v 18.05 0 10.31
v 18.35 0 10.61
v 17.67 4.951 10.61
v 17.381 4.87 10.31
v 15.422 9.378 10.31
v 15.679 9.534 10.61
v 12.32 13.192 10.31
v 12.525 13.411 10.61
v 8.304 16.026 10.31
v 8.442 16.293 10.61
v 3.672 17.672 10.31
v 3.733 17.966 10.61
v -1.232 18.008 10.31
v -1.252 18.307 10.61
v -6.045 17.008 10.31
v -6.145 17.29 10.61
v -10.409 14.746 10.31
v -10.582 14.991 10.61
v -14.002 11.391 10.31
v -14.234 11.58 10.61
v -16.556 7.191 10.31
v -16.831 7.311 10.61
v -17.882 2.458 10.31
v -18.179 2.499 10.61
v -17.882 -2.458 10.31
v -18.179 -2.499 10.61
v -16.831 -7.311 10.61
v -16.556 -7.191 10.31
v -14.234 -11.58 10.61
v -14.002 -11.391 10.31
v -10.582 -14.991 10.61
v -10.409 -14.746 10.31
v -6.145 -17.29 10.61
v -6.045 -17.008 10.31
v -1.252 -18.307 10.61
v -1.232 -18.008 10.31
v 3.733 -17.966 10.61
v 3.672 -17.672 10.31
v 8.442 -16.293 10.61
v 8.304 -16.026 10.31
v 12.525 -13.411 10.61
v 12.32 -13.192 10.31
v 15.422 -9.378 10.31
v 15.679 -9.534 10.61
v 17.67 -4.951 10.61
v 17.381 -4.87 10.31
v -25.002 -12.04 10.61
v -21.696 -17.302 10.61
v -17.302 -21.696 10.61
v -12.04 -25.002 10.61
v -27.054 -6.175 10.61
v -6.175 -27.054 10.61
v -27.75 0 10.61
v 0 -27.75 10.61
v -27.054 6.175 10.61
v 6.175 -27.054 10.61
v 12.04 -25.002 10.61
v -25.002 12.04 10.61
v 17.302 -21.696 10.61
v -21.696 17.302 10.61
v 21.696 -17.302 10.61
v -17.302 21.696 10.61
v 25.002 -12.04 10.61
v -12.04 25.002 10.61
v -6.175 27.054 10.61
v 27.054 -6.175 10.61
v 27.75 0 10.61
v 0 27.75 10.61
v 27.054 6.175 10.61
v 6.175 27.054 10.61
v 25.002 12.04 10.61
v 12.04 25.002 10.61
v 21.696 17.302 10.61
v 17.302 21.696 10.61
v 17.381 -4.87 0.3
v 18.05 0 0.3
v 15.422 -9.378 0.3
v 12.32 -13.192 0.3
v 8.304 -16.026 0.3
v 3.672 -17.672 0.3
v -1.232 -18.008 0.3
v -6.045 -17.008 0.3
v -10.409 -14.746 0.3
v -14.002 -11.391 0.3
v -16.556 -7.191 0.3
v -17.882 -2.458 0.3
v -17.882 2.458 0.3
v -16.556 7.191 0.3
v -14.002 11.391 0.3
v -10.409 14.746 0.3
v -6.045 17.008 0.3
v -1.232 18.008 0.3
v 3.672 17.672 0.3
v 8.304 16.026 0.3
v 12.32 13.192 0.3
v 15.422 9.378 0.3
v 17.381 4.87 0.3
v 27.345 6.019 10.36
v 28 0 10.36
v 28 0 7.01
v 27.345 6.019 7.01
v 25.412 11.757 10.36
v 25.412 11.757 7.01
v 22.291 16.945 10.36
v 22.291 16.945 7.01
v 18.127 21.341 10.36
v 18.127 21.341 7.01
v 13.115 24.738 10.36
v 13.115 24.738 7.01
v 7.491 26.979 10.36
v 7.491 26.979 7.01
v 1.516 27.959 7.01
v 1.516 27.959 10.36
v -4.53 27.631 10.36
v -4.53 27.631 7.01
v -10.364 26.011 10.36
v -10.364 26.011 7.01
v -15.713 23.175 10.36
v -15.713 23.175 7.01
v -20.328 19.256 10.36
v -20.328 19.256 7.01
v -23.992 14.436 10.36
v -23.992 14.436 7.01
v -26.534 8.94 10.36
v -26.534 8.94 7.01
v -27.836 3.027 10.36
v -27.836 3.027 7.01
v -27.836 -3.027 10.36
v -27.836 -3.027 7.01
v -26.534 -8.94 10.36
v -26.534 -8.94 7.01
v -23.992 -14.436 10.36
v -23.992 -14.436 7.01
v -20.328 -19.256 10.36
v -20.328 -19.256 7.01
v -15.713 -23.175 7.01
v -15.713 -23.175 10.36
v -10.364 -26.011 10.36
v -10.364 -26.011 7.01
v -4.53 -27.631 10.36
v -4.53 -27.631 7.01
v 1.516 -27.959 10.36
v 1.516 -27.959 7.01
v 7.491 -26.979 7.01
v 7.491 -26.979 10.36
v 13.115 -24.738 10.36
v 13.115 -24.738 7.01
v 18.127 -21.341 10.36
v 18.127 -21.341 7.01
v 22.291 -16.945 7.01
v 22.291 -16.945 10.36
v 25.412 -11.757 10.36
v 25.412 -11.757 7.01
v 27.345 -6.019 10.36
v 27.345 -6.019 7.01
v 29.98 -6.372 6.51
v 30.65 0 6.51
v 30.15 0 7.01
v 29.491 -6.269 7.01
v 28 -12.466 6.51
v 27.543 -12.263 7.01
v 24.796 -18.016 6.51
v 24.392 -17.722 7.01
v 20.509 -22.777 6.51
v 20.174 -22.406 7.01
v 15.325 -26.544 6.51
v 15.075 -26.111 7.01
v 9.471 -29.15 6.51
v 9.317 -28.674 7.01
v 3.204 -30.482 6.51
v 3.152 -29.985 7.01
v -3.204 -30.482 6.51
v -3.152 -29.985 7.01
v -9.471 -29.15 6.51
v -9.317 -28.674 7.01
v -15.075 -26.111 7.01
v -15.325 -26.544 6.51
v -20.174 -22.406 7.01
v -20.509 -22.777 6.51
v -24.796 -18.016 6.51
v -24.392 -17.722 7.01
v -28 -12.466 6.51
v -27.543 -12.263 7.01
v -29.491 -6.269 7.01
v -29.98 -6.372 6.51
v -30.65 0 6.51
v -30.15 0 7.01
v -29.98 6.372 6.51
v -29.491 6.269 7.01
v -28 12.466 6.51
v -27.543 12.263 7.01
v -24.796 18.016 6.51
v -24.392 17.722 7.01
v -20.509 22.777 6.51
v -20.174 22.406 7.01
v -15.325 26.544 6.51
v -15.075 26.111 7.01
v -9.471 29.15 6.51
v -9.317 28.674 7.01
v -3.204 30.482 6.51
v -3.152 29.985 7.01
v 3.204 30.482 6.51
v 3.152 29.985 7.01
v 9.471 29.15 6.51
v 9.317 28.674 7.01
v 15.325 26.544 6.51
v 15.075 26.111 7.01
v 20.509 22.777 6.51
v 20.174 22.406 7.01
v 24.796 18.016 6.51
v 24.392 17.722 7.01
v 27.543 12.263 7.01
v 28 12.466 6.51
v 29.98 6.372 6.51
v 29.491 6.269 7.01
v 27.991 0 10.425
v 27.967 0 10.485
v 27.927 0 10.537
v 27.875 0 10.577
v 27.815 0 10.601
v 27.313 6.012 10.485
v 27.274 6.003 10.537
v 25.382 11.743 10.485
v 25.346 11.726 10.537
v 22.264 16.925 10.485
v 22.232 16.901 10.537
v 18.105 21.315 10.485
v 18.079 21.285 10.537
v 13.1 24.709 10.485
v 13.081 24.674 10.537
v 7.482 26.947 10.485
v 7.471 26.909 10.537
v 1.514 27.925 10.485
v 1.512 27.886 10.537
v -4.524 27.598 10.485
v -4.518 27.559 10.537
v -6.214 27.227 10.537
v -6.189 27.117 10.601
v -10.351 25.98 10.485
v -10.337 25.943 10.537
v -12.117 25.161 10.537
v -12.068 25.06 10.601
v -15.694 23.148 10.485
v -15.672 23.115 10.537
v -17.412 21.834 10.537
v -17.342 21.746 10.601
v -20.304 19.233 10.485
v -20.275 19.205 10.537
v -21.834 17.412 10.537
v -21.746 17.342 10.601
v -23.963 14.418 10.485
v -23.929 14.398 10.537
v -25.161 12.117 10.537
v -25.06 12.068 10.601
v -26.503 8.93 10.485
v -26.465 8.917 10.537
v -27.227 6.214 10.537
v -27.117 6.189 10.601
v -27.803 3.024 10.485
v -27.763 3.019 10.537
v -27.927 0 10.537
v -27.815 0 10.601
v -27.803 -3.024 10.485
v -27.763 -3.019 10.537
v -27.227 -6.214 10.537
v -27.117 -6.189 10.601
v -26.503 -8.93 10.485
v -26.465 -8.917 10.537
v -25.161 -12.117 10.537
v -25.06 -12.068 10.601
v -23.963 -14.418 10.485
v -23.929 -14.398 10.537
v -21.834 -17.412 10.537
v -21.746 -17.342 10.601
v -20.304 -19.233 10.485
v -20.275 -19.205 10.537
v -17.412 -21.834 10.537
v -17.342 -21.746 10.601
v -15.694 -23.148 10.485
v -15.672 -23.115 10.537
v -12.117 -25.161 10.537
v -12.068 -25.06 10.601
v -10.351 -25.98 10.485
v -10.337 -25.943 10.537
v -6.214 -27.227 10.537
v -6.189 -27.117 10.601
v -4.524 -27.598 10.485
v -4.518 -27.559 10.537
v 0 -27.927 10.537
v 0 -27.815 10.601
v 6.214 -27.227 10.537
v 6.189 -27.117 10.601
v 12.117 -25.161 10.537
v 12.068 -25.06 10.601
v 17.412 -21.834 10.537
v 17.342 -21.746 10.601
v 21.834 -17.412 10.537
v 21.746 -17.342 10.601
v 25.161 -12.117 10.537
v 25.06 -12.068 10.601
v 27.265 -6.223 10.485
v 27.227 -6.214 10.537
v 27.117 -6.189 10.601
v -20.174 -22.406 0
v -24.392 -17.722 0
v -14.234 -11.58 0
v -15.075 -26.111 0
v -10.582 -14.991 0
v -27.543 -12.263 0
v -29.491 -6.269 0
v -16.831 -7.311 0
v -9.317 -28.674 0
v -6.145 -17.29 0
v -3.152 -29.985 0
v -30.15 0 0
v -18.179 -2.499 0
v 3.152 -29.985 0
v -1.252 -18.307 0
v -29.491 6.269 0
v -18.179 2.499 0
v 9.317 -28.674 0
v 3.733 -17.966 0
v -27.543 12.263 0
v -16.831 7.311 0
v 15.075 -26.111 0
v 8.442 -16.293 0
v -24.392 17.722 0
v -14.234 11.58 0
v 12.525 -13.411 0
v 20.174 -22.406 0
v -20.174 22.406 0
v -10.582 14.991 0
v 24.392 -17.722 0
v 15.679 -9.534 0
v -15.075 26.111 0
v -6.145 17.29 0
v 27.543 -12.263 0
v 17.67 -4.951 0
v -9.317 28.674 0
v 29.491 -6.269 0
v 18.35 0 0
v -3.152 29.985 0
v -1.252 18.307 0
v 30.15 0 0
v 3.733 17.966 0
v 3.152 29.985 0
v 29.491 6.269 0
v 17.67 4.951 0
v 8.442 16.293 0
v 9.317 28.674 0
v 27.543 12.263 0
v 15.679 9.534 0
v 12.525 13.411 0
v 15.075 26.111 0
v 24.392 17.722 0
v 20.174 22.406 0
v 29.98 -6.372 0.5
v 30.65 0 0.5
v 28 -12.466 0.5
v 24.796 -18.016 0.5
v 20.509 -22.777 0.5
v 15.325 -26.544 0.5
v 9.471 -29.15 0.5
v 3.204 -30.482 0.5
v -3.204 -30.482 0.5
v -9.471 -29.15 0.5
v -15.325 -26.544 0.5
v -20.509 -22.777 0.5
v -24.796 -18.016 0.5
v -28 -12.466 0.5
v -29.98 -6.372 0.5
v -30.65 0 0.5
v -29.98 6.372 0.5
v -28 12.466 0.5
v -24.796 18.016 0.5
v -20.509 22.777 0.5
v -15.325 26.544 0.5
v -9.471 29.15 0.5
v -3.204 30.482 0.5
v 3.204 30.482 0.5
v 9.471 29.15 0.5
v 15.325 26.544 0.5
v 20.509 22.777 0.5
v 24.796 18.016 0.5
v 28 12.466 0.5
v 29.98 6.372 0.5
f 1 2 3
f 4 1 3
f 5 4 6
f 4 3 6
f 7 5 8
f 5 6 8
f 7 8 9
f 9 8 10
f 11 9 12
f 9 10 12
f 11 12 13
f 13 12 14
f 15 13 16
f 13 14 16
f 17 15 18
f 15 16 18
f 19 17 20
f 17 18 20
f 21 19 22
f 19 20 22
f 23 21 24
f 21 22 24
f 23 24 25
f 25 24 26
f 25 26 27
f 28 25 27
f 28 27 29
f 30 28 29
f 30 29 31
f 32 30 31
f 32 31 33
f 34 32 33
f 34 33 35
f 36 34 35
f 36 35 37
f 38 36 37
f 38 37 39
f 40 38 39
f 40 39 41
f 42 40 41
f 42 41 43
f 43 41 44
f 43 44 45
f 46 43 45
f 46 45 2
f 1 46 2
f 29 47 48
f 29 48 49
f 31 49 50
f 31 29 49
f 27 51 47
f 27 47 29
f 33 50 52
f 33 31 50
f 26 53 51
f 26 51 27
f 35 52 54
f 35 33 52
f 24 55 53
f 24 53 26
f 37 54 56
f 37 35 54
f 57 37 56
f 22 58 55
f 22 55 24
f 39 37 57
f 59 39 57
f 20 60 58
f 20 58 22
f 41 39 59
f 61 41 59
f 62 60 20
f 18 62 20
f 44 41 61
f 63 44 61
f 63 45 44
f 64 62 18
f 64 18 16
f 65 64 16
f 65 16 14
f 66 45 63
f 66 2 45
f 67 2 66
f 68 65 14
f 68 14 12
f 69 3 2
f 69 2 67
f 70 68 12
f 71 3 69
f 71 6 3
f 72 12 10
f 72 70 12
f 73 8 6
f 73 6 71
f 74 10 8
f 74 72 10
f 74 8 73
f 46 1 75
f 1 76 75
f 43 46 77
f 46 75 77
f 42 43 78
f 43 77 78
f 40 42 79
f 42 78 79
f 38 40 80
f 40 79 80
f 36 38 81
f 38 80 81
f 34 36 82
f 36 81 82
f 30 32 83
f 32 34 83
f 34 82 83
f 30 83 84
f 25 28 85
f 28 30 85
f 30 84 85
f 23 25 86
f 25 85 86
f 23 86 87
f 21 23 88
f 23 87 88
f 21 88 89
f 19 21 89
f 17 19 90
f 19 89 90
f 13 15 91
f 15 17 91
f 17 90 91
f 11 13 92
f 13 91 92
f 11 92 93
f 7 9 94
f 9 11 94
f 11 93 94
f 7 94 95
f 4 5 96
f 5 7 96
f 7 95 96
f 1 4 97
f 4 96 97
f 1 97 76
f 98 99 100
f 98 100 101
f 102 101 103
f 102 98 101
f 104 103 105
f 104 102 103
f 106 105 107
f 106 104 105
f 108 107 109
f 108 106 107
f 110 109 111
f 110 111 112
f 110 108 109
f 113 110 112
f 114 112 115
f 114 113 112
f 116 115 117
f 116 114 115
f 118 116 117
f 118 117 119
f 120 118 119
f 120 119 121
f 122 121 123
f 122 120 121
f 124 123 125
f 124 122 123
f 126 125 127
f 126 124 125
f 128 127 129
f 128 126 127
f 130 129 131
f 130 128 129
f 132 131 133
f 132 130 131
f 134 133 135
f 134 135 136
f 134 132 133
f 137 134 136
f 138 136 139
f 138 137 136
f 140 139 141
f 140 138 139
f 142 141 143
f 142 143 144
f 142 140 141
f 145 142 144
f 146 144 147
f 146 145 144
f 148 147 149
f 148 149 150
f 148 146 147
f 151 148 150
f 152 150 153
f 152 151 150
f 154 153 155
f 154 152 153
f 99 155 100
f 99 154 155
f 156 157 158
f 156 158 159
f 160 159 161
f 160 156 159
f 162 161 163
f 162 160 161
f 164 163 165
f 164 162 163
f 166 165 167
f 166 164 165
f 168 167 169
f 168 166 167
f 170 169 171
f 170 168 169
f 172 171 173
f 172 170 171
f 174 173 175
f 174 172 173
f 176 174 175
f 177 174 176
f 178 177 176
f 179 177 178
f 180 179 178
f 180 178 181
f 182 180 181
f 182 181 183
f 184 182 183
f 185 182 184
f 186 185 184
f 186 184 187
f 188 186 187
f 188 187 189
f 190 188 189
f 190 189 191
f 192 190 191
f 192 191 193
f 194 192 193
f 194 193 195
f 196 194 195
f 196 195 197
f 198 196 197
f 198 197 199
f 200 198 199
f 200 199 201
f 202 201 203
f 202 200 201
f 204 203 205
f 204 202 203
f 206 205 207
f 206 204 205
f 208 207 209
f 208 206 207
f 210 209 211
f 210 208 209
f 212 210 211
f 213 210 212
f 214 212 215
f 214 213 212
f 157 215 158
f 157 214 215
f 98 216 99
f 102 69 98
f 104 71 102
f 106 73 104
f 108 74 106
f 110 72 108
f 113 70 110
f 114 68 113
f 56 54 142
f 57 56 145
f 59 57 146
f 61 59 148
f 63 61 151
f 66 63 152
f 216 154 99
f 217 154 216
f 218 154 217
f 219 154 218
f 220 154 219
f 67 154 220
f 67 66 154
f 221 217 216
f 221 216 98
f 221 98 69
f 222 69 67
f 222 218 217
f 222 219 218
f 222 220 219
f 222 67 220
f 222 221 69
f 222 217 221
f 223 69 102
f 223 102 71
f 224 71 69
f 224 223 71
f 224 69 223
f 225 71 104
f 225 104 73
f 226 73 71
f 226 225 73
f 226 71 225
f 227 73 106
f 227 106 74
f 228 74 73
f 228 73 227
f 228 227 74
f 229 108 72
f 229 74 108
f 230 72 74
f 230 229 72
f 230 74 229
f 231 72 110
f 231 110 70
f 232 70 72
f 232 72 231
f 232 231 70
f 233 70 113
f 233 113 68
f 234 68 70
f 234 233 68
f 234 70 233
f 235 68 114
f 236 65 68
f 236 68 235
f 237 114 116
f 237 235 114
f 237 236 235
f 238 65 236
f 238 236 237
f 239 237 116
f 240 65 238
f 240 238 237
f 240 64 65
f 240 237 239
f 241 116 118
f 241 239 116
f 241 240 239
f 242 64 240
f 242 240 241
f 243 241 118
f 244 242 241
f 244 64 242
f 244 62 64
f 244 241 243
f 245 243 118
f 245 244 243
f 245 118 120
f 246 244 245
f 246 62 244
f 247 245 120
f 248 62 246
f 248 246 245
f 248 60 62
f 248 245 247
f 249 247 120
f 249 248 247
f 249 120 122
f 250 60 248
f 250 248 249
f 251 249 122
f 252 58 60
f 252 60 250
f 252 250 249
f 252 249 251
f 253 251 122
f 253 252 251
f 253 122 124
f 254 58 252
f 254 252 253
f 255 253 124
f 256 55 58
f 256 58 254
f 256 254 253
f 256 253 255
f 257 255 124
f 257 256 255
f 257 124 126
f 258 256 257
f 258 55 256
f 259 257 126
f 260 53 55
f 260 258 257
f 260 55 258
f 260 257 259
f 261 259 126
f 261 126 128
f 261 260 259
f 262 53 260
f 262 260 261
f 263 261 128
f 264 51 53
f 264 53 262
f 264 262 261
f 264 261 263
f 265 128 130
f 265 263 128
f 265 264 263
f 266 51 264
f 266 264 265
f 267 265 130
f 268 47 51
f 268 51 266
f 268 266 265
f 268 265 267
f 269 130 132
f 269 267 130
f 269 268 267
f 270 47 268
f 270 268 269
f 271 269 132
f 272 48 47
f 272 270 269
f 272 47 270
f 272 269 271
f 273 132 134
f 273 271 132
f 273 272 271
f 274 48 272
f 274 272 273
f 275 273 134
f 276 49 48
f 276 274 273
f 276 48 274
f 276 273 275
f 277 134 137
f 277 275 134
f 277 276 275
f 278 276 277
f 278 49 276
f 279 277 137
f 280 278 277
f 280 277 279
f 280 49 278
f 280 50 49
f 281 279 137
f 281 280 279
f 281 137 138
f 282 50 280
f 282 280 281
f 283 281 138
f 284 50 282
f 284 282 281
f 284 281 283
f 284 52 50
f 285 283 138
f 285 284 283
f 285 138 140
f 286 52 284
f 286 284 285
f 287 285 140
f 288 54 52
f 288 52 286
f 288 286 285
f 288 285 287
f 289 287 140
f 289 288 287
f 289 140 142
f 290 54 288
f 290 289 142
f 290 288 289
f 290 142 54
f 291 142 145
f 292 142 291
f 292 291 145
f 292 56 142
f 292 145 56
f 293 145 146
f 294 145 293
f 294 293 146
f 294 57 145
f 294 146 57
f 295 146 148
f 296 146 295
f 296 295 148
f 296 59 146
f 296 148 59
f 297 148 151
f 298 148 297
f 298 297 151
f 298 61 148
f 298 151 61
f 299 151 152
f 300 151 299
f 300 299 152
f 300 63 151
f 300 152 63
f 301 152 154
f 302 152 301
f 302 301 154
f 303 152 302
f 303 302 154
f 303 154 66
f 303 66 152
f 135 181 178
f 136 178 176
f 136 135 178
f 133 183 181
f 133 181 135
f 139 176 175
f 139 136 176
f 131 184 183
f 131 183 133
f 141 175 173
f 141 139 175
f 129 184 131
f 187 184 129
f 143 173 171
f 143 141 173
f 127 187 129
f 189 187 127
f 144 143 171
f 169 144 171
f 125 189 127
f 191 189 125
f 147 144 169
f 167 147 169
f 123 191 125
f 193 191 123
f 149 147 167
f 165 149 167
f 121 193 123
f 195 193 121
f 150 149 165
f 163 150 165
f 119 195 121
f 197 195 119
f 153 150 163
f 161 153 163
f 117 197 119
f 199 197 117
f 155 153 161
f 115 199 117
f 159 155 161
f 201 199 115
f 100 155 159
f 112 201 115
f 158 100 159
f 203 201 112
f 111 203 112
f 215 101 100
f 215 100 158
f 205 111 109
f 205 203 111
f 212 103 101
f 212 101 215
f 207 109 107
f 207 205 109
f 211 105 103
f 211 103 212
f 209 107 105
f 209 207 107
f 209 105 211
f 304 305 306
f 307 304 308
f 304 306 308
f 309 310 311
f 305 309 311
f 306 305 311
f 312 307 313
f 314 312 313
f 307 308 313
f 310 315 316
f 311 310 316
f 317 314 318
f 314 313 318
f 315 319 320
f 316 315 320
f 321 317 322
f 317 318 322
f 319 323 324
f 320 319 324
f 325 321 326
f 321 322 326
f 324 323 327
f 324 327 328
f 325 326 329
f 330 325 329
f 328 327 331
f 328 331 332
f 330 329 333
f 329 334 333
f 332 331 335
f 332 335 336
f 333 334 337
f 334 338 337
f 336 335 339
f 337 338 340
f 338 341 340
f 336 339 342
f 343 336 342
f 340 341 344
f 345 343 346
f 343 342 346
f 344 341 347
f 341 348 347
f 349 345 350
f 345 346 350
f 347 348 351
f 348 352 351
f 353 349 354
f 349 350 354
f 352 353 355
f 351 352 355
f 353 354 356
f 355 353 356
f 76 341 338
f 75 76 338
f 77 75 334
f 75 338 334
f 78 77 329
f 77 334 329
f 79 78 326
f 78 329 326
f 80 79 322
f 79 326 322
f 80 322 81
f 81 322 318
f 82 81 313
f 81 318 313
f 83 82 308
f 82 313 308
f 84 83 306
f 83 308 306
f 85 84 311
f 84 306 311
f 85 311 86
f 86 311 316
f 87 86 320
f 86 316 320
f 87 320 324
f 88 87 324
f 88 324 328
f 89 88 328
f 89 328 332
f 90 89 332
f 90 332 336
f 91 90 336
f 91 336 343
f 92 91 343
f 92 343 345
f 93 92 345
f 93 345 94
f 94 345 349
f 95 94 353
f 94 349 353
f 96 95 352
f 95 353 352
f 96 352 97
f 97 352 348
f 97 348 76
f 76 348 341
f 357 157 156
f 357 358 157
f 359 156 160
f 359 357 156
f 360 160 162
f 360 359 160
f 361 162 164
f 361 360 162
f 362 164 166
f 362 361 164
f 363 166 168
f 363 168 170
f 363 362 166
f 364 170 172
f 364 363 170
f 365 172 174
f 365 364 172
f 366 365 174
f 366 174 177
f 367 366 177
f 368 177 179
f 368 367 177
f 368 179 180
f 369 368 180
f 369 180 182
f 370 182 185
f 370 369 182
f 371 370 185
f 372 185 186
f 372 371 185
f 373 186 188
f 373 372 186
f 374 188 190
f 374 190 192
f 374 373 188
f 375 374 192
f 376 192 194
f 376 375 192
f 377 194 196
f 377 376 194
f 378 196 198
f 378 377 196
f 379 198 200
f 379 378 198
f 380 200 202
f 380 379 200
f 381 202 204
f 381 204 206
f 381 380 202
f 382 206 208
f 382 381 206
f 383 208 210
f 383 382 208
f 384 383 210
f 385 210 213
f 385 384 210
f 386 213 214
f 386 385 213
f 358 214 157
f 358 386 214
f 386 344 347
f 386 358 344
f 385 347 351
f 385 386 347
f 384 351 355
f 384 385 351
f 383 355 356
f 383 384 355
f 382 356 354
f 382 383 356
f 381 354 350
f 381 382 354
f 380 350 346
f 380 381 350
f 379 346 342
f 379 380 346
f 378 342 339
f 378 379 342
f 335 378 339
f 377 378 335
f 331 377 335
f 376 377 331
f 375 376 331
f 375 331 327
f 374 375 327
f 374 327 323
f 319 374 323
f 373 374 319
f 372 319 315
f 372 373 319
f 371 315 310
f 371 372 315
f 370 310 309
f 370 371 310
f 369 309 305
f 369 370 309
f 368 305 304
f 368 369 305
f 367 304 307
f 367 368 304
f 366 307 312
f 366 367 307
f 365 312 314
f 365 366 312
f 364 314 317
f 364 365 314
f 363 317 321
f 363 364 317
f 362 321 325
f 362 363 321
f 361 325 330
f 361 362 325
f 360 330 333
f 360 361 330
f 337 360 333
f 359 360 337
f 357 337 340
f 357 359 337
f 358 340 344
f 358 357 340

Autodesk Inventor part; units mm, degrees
ref_plane "YZ Plane" through (0, 0, 0) normal (1, 0, 0) x (0, 1, 0)
ref_plane "XZ Plane" through (0, 0, 0) normal (0, 1, 0) x (-1, 0, 0)
ref_plane "XY Plane" through (0, 0, 0) normal (0, 0, 1) x (1, 0, 0)
sketch "草圖1" plane through (0, 0, 0) normal (0, 0, 1) x (1, 0, 0)
  circle A0 centre (0, 0) radius 18.05
  circle A1 centre (0, 0) radius 30.65
  dimension "d0" = 36.1
  dimension "d1" = 61.3
extrude "擠出1" add sketch "草圖1" along normal blind 10.61
sketch "草圖2" plane through (0, 0, 10.61) normal (0, 0, 1) x (1, 0, 0)
  circle A0 centre (0, 0) radius 28
  circle A1 centre (0, 0) radius 39.6506
  dimension "d4" = 56
extrude "擠出2" cut sketch "草圖2" against normal blind 3.6
chamfer "倒角1" distance 0.3 angle 45 1 edges at (-18.05, 0, 0)
chamfer "倒角2" distance 0.5 angle 45 1 edges at (-30.65, 0, 0)
chamfer "倒角3" distance 0.5 angle 45 1 edges at (-30.65, 0, 7.01)
fillet "圓角1" radius 0.25 1 edges at (-28, 0, 10.61)
chamfer "倒角4" distance 0.3 angle 45 1 edges at (-18.05, 0, 10.61)
properties part number "IGX間隔環"
